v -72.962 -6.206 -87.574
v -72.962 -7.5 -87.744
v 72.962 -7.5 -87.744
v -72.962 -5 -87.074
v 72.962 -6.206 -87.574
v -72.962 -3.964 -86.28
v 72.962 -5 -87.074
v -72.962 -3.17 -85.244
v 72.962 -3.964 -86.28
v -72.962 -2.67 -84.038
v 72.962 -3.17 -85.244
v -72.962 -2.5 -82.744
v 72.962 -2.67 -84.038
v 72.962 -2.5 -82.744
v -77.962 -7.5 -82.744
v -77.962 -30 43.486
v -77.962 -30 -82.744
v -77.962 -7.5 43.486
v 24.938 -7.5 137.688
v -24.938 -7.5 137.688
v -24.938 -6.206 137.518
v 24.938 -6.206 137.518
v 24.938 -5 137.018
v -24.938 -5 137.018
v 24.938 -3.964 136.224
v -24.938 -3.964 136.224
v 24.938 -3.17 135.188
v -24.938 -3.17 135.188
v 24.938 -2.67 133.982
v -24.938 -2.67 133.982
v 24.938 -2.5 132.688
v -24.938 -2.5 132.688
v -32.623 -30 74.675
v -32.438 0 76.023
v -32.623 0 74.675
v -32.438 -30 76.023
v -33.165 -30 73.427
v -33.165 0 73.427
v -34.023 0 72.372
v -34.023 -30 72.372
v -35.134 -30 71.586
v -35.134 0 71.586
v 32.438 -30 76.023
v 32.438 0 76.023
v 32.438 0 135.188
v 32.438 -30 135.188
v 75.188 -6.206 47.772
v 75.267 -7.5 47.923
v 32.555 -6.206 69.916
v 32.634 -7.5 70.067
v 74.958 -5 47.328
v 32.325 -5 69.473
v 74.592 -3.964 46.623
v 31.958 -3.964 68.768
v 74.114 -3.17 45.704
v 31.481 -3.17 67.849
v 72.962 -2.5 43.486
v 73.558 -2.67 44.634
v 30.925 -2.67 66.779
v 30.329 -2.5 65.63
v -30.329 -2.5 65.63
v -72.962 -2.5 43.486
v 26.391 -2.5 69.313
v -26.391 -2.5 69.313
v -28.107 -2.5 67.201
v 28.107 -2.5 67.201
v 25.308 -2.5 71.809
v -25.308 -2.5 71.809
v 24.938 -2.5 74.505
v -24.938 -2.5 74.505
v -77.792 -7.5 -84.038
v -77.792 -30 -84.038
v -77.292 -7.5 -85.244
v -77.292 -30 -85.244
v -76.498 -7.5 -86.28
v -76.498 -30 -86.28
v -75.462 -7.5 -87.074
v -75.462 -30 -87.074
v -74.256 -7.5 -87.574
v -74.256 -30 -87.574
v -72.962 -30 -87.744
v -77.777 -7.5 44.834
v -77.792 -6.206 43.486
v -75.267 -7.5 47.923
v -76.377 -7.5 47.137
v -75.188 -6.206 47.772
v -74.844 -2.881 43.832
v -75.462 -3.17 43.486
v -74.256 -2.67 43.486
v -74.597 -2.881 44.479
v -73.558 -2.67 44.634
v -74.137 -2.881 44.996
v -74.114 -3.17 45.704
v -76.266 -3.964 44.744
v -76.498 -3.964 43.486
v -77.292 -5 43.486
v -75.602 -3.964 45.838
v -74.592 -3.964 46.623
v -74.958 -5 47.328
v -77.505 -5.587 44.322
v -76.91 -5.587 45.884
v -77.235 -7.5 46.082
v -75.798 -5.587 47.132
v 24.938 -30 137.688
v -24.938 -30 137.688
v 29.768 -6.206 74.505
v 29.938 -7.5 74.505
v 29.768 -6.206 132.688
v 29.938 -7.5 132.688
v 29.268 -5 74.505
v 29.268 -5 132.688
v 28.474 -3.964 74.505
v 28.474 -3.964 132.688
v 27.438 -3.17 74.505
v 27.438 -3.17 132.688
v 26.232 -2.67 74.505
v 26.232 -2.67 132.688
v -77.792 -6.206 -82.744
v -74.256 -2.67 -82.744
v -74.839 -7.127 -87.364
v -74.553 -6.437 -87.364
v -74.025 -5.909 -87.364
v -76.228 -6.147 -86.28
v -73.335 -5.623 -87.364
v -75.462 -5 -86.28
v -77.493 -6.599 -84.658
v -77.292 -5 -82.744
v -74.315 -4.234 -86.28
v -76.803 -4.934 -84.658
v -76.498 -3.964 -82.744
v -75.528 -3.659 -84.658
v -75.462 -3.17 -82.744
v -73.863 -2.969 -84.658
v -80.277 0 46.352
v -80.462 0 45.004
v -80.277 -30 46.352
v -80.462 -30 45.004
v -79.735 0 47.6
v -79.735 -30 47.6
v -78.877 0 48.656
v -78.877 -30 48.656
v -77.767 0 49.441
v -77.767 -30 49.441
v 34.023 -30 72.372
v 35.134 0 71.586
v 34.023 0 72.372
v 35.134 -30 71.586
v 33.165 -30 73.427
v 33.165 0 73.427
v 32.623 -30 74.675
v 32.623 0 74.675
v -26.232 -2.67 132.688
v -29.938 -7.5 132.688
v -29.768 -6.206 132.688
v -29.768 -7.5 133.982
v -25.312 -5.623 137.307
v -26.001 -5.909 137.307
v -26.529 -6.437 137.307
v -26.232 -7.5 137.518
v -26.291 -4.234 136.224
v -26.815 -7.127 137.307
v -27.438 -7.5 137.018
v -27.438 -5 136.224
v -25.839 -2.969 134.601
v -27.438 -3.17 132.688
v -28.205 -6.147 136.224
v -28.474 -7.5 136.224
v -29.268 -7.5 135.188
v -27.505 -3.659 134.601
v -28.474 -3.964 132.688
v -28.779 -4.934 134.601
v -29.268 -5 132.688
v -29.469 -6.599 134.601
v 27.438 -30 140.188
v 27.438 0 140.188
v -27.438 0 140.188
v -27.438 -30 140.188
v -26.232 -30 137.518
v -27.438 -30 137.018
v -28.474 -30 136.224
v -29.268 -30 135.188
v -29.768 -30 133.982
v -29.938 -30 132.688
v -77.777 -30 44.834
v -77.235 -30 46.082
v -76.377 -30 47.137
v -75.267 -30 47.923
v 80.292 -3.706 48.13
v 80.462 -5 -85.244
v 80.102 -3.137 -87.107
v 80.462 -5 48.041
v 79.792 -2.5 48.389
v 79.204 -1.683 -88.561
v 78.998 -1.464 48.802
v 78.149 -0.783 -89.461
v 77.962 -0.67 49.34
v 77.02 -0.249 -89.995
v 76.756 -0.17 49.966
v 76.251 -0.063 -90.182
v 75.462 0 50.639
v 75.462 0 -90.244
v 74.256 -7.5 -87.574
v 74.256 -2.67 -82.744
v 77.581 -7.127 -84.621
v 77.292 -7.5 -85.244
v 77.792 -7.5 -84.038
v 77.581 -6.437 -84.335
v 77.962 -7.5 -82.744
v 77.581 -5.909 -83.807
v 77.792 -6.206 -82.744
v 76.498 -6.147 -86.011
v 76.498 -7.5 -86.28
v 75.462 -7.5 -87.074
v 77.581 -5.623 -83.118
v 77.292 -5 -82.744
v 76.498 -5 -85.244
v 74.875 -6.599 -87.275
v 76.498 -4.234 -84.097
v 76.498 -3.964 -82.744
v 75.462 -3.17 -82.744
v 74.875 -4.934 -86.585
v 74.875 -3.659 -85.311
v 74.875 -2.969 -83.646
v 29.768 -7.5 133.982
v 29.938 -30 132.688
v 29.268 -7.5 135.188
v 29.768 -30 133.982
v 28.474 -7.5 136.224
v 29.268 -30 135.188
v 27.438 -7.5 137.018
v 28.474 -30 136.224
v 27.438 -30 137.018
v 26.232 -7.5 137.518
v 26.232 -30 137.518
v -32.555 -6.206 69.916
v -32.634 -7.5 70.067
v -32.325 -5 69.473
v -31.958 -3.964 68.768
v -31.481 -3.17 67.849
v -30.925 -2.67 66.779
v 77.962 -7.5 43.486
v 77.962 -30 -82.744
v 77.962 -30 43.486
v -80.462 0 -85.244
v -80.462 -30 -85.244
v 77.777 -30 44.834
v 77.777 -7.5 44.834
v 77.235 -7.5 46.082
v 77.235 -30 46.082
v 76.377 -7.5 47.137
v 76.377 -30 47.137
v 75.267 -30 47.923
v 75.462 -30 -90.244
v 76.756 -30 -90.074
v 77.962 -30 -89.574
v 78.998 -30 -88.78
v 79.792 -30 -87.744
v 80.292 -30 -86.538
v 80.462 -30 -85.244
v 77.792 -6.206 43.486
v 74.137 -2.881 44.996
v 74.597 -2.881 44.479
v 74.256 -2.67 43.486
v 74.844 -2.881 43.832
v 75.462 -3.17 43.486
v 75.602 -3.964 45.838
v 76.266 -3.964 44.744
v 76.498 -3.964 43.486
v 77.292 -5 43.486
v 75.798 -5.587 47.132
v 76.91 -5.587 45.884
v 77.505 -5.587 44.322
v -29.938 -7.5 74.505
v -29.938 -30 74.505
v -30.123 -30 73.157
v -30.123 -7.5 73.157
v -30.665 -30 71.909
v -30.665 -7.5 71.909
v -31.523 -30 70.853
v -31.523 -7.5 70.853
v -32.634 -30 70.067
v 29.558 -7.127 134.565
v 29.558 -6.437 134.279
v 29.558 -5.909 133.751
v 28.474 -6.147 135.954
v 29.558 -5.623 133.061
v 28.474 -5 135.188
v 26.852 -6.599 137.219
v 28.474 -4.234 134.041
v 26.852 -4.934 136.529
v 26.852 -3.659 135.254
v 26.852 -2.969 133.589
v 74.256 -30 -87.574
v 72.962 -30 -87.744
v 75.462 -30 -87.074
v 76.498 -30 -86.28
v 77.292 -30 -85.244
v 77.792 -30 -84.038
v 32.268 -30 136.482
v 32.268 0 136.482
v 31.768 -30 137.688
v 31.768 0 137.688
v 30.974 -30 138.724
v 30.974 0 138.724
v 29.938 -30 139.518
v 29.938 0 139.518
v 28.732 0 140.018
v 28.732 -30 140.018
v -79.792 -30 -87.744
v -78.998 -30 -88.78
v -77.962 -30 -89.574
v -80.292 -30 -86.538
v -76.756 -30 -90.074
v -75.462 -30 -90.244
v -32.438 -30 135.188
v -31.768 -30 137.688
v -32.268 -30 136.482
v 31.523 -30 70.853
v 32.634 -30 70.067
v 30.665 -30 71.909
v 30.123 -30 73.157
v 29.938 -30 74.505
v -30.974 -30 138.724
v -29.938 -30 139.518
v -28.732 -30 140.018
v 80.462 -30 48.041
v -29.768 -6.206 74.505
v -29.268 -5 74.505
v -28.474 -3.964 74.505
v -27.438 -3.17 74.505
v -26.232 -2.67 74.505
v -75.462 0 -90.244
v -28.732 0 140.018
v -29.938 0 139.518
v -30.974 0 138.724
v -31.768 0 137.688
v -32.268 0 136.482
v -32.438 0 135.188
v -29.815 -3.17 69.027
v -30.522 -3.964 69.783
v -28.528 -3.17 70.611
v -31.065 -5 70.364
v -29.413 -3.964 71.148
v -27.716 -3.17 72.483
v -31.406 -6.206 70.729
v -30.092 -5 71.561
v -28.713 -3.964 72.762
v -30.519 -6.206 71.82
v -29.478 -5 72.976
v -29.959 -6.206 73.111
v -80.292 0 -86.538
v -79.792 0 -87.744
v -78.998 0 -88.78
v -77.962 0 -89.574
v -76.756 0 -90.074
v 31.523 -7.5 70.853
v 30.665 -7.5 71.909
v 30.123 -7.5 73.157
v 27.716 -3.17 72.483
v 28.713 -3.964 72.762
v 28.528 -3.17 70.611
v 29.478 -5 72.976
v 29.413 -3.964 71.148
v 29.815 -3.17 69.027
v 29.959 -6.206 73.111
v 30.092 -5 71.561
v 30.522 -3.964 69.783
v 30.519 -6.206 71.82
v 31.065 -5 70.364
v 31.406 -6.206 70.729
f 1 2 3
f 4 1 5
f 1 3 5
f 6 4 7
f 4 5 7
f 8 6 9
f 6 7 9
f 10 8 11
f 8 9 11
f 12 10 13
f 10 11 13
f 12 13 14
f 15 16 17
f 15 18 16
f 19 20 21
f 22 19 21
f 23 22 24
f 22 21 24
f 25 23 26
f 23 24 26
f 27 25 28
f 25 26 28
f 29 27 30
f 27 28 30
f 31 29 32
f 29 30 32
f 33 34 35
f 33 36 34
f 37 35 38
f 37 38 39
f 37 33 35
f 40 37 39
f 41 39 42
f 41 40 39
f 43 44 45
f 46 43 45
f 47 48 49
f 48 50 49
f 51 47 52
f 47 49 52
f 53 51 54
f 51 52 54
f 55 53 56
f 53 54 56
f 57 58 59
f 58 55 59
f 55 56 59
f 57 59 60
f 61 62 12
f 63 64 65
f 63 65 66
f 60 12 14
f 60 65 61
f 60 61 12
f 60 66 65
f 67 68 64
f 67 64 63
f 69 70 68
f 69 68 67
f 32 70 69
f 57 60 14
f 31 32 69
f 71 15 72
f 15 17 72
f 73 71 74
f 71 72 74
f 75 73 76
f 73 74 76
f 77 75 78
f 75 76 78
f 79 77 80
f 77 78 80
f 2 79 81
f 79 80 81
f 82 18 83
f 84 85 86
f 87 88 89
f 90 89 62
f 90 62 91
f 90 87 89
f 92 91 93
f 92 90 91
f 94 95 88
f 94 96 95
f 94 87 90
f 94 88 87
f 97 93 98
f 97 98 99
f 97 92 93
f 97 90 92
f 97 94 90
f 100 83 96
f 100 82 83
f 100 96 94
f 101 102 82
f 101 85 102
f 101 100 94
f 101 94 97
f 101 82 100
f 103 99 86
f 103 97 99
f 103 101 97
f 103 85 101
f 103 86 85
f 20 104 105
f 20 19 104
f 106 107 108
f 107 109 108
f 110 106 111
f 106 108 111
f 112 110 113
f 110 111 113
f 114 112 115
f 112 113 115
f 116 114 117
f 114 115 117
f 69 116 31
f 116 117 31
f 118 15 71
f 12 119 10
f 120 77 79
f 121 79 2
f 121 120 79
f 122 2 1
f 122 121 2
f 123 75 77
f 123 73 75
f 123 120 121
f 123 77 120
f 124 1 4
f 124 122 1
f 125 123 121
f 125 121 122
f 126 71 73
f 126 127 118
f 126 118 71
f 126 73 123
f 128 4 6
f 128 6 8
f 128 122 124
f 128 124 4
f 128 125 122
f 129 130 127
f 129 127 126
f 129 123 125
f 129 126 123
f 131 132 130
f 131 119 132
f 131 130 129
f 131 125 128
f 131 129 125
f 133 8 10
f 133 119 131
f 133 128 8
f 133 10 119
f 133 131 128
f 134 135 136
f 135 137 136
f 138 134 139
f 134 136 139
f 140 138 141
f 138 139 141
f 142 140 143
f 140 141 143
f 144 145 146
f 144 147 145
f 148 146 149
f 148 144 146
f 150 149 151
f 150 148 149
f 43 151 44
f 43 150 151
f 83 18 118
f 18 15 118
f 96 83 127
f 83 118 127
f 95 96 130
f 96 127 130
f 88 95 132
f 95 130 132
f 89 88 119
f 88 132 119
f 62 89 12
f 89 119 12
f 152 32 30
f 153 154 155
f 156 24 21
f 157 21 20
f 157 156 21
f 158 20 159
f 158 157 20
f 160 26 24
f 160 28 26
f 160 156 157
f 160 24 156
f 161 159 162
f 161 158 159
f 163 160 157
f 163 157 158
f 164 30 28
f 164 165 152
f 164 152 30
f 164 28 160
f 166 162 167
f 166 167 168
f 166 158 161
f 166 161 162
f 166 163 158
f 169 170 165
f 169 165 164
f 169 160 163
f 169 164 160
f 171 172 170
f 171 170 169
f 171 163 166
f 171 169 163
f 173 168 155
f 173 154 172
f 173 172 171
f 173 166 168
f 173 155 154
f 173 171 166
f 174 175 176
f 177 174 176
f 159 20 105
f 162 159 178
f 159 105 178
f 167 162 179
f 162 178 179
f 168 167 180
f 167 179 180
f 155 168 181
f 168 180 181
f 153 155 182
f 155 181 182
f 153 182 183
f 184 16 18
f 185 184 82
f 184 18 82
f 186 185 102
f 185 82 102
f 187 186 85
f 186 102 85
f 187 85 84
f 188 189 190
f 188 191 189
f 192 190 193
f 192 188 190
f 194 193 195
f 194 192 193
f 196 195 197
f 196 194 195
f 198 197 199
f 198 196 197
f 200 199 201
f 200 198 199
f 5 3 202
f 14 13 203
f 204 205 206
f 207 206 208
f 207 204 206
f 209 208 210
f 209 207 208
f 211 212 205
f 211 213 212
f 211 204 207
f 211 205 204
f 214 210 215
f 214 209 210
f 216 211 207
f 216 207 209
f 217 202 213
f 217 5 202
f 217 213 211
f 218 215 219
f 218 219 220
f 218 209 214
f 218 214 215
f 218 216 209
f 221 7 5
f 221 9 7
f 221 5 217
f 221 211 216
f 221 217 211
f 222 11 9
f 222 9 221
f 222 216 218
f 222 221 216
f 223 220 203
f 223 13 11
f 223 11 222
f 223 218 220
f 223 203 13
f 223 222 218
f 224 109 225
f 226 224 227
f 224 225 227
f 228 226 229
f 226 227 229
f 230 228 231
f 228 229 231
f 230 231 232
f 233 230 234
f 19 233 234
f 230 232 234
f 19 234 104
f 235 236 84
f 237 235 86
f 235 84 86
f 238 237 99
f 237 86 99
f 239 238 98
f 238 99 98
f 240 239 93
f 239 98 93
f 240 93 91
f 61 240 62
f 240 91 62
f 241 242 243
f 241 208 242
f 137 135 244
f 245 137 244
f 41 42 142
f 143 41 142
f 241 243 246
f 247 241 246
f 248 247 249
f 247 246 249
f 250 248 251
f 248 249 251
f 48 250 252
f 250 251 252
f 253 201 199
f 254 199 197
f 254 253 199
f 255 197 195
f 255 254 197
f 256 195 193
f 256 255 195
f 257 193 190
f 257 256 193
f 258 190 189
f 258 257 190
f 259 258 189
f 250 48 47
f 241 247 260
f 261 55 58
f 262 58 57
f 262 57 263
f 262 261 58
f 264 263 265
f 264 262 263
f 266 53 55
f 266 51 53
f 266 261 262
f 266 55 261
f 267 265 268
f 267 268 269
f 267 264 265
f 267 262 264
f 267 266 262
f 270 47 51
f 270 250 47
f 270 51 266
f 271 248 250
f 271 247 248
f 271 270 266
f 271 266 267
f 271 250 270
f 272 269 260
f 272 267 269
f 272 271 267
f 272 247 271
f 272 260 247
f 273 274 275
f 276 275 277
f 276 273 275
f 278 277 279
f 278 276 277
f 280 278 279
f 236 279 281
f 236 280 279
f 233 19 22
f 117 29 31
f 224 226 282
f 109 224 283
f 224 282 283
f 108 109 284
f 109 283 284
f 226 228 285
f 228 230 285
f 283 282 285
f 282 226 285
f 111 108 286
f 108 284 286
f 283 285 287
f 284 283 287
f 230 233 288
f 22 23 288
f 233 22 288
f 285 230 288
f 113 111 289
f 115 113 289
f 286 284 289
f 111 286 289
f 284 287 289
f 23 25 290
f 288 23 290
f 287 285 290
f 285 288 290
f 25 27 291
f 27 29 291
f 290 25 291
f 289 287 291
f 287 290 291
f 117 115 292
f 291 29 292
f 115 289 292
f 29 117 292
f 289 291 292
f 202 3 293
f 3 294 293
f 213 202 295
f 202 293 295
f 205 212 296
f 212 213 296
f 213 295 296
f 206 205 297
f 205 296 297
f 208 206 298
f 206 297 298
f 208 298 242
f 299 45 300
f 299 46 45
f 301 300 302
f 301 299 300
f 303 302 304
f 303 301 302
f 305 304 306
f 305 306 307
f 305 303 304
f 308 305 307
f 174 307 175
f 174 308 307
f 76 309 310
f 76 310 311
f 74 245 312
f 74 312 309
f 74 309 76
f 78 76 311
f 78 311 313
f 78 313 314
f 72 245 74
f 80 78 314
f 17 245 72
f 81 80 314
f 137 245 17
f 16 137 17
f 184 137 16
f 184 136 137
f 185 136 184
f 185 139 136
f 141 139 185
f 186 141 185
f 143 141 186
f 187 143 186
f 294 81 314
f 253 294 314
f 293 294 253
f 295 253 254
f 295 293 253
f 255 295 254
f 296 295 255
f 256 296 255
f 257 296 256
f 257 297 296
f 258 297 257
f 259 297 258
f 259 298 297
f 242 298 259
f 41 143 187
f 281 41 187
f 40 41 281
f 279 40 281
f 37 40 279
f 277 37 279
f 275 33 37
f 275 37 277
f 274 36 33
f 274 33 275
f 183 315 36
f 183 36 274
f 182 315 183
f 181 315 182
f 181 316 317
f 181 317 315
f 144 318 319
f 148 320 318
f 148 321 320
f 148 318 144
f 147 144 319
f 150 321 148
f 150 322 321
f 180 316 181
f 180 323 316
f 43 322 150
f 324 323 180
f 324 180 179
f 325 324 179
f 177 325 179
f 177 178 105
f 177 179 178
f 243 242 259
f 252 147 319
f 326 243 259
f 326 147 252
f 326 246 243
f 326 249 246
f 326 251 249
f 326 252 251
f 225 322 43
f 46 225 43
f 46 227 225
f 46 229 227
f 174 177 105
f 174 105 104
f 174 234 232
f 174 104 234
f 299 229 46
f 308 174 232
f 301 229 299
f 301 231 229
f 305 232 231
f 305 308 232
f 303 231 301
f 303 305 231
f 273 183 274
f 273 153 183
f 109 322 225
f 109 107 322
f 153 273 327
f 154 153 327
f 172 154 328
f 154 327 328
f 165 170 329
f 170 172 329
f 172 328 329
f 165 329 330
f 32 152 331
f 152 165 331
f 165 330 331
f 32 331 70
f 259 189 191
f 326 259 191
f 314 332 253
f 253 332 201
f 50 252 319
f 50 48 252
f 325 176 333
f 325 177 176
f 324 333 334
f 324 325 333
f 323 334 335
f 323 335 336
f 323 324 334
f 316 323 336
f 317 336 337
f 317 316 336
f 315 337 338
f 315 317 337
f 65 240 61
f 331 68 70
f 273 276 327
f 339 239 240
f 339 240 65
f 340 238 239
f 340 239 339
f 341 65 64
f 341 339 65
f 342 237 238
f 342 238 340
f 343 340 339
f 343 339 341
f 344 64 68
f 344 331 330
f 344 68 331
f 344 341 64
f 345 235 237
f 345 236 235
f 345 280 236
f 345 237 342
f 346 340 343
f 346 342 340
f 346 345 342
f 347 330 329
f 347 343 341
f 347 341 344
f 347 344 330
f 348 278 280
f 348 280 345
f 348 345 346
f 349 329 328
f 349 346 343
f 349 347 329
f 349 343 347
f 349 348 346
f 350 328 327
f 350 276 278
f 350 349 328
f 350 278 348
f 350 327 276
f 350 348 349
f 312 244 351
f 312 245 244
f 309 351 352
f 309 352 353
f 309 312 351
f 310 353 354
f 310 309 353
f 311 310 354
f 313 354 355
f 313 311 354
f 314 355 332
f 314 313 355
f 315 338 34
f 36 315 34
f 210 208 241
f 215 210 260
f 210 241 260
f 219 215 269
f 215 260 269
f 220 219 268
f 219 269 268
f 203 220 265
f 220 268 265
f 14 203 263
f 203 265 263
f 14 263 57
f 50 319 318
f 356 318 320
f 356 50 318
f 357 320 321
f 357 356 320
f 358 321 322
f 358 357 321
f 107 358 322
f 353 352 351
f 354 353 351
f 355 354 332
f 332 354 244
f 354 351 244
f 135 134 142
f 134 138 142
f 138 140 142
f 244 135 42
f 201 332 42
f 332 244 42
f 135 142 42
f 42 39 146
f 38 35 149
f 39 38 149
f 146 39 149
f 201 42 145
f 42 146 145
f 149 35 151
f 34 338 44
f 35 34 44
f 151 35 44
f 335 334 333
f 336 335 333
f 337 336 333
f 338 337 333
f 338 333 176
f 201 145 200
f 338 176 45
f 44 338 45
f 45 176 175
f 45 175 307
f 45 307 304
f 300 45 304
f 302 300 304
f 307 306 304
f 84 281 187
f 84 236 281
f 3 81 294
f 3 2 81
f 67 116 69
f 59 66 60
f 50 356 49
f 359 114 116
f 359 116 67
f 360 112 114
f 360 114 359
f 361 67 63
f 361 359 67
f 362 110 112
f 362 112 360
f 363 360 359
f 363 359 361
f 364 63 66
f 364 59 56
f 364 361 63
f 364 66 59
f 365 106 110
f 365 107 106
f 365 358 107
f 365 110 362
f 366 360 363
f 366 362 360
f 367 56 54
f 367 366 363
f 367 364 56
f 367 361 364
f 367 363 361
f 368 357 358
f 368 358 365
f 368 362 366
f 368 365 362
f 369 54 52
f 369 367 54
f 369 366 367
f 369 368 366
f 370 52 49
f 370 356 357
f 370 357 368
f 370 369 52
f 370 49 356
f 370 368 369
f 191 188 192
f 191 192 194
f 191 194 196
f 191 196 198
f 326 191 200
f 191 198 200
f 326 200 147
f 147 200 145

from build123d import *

# Parameters (mm, degrees)
F1_DEPTH = 30
F2_T     = -2.5
F3_R     = 5
F4_R     = 5


with BuildPart() as f1:
    # F0 (on Front) → F1 (new body)
    with BuildSketch(Plane.XZ):
        Polygon((-80.4619731335, 48.0414940363), (-80.4619731335, -90.2443051724), (80.4619731335, -90.2443051724), (80.4619731335, 48.0414940363), (32.4382460701, 72.9859998765), (32.4382460701, 140.1879998765), (-32.4382460701, 140.1879998765), (-32.4382460701, 72.9859998765), align=None)
    extrude(amount=F1_DEPTH)

    # F2
    f2_openings = [f1.faces().sort_by_distance(p)[0] for p in [
        (0, -30, 5.455809),
    ]]
    offset(amount=F2_T, openings=f2_openings, kind=Kind.INTERSECTION)

    # F3
    f3_edges = [f1.edges().sort_by_distance(p)[0] for p in [
        (-77.961973, -2.5, -20.610696),
        (-53.95011, -2.5, 58.995166),
        (-29.938246, -2.5, 104.577709),
        (0, -2.5, 137.688),
        (29.938246, -16.25, 137.688),
        (29.938246, -2.5, 104.577709),
        (53.95011, -2.5, 58.995166),
        (29.938246, -16.25, 71.467419),
        (-29.938246, -16.25, 71.467419),
        (-77.961973, -16.25, -87.744305),
        (0, -2.5, -87.744305),
        (77.961973, -16.25, -87.744305),
        (77.961973, -2.5, -20.610696),
        (-77.961973, -16.25, 46.522913),
        (-29.938246, -16.25, 137.688),
        (77.961973, -16.25, 46.522913),
    ]]
    fillet(f3_edges, radius=F3_R)

    # F4
    f4_edges = [f1.edges().sort_by_distance(p)[0] for p in [
        (32.438246, -15, 140.188),
        (80.461973, 0, -21.101406),
        (-32.438246, -15, 140.188),
        (-32.438246, -15, 72.986),
        (32.438246, -15, 72.986),
        (-80.461973, -15, 48.041494),
        (-80.461973, -15, -90.244305),
        (80.461973, -15, -90.244305),
    ]]
    fillet(f4_edges, radius=F4_R)


solid = f1.part
